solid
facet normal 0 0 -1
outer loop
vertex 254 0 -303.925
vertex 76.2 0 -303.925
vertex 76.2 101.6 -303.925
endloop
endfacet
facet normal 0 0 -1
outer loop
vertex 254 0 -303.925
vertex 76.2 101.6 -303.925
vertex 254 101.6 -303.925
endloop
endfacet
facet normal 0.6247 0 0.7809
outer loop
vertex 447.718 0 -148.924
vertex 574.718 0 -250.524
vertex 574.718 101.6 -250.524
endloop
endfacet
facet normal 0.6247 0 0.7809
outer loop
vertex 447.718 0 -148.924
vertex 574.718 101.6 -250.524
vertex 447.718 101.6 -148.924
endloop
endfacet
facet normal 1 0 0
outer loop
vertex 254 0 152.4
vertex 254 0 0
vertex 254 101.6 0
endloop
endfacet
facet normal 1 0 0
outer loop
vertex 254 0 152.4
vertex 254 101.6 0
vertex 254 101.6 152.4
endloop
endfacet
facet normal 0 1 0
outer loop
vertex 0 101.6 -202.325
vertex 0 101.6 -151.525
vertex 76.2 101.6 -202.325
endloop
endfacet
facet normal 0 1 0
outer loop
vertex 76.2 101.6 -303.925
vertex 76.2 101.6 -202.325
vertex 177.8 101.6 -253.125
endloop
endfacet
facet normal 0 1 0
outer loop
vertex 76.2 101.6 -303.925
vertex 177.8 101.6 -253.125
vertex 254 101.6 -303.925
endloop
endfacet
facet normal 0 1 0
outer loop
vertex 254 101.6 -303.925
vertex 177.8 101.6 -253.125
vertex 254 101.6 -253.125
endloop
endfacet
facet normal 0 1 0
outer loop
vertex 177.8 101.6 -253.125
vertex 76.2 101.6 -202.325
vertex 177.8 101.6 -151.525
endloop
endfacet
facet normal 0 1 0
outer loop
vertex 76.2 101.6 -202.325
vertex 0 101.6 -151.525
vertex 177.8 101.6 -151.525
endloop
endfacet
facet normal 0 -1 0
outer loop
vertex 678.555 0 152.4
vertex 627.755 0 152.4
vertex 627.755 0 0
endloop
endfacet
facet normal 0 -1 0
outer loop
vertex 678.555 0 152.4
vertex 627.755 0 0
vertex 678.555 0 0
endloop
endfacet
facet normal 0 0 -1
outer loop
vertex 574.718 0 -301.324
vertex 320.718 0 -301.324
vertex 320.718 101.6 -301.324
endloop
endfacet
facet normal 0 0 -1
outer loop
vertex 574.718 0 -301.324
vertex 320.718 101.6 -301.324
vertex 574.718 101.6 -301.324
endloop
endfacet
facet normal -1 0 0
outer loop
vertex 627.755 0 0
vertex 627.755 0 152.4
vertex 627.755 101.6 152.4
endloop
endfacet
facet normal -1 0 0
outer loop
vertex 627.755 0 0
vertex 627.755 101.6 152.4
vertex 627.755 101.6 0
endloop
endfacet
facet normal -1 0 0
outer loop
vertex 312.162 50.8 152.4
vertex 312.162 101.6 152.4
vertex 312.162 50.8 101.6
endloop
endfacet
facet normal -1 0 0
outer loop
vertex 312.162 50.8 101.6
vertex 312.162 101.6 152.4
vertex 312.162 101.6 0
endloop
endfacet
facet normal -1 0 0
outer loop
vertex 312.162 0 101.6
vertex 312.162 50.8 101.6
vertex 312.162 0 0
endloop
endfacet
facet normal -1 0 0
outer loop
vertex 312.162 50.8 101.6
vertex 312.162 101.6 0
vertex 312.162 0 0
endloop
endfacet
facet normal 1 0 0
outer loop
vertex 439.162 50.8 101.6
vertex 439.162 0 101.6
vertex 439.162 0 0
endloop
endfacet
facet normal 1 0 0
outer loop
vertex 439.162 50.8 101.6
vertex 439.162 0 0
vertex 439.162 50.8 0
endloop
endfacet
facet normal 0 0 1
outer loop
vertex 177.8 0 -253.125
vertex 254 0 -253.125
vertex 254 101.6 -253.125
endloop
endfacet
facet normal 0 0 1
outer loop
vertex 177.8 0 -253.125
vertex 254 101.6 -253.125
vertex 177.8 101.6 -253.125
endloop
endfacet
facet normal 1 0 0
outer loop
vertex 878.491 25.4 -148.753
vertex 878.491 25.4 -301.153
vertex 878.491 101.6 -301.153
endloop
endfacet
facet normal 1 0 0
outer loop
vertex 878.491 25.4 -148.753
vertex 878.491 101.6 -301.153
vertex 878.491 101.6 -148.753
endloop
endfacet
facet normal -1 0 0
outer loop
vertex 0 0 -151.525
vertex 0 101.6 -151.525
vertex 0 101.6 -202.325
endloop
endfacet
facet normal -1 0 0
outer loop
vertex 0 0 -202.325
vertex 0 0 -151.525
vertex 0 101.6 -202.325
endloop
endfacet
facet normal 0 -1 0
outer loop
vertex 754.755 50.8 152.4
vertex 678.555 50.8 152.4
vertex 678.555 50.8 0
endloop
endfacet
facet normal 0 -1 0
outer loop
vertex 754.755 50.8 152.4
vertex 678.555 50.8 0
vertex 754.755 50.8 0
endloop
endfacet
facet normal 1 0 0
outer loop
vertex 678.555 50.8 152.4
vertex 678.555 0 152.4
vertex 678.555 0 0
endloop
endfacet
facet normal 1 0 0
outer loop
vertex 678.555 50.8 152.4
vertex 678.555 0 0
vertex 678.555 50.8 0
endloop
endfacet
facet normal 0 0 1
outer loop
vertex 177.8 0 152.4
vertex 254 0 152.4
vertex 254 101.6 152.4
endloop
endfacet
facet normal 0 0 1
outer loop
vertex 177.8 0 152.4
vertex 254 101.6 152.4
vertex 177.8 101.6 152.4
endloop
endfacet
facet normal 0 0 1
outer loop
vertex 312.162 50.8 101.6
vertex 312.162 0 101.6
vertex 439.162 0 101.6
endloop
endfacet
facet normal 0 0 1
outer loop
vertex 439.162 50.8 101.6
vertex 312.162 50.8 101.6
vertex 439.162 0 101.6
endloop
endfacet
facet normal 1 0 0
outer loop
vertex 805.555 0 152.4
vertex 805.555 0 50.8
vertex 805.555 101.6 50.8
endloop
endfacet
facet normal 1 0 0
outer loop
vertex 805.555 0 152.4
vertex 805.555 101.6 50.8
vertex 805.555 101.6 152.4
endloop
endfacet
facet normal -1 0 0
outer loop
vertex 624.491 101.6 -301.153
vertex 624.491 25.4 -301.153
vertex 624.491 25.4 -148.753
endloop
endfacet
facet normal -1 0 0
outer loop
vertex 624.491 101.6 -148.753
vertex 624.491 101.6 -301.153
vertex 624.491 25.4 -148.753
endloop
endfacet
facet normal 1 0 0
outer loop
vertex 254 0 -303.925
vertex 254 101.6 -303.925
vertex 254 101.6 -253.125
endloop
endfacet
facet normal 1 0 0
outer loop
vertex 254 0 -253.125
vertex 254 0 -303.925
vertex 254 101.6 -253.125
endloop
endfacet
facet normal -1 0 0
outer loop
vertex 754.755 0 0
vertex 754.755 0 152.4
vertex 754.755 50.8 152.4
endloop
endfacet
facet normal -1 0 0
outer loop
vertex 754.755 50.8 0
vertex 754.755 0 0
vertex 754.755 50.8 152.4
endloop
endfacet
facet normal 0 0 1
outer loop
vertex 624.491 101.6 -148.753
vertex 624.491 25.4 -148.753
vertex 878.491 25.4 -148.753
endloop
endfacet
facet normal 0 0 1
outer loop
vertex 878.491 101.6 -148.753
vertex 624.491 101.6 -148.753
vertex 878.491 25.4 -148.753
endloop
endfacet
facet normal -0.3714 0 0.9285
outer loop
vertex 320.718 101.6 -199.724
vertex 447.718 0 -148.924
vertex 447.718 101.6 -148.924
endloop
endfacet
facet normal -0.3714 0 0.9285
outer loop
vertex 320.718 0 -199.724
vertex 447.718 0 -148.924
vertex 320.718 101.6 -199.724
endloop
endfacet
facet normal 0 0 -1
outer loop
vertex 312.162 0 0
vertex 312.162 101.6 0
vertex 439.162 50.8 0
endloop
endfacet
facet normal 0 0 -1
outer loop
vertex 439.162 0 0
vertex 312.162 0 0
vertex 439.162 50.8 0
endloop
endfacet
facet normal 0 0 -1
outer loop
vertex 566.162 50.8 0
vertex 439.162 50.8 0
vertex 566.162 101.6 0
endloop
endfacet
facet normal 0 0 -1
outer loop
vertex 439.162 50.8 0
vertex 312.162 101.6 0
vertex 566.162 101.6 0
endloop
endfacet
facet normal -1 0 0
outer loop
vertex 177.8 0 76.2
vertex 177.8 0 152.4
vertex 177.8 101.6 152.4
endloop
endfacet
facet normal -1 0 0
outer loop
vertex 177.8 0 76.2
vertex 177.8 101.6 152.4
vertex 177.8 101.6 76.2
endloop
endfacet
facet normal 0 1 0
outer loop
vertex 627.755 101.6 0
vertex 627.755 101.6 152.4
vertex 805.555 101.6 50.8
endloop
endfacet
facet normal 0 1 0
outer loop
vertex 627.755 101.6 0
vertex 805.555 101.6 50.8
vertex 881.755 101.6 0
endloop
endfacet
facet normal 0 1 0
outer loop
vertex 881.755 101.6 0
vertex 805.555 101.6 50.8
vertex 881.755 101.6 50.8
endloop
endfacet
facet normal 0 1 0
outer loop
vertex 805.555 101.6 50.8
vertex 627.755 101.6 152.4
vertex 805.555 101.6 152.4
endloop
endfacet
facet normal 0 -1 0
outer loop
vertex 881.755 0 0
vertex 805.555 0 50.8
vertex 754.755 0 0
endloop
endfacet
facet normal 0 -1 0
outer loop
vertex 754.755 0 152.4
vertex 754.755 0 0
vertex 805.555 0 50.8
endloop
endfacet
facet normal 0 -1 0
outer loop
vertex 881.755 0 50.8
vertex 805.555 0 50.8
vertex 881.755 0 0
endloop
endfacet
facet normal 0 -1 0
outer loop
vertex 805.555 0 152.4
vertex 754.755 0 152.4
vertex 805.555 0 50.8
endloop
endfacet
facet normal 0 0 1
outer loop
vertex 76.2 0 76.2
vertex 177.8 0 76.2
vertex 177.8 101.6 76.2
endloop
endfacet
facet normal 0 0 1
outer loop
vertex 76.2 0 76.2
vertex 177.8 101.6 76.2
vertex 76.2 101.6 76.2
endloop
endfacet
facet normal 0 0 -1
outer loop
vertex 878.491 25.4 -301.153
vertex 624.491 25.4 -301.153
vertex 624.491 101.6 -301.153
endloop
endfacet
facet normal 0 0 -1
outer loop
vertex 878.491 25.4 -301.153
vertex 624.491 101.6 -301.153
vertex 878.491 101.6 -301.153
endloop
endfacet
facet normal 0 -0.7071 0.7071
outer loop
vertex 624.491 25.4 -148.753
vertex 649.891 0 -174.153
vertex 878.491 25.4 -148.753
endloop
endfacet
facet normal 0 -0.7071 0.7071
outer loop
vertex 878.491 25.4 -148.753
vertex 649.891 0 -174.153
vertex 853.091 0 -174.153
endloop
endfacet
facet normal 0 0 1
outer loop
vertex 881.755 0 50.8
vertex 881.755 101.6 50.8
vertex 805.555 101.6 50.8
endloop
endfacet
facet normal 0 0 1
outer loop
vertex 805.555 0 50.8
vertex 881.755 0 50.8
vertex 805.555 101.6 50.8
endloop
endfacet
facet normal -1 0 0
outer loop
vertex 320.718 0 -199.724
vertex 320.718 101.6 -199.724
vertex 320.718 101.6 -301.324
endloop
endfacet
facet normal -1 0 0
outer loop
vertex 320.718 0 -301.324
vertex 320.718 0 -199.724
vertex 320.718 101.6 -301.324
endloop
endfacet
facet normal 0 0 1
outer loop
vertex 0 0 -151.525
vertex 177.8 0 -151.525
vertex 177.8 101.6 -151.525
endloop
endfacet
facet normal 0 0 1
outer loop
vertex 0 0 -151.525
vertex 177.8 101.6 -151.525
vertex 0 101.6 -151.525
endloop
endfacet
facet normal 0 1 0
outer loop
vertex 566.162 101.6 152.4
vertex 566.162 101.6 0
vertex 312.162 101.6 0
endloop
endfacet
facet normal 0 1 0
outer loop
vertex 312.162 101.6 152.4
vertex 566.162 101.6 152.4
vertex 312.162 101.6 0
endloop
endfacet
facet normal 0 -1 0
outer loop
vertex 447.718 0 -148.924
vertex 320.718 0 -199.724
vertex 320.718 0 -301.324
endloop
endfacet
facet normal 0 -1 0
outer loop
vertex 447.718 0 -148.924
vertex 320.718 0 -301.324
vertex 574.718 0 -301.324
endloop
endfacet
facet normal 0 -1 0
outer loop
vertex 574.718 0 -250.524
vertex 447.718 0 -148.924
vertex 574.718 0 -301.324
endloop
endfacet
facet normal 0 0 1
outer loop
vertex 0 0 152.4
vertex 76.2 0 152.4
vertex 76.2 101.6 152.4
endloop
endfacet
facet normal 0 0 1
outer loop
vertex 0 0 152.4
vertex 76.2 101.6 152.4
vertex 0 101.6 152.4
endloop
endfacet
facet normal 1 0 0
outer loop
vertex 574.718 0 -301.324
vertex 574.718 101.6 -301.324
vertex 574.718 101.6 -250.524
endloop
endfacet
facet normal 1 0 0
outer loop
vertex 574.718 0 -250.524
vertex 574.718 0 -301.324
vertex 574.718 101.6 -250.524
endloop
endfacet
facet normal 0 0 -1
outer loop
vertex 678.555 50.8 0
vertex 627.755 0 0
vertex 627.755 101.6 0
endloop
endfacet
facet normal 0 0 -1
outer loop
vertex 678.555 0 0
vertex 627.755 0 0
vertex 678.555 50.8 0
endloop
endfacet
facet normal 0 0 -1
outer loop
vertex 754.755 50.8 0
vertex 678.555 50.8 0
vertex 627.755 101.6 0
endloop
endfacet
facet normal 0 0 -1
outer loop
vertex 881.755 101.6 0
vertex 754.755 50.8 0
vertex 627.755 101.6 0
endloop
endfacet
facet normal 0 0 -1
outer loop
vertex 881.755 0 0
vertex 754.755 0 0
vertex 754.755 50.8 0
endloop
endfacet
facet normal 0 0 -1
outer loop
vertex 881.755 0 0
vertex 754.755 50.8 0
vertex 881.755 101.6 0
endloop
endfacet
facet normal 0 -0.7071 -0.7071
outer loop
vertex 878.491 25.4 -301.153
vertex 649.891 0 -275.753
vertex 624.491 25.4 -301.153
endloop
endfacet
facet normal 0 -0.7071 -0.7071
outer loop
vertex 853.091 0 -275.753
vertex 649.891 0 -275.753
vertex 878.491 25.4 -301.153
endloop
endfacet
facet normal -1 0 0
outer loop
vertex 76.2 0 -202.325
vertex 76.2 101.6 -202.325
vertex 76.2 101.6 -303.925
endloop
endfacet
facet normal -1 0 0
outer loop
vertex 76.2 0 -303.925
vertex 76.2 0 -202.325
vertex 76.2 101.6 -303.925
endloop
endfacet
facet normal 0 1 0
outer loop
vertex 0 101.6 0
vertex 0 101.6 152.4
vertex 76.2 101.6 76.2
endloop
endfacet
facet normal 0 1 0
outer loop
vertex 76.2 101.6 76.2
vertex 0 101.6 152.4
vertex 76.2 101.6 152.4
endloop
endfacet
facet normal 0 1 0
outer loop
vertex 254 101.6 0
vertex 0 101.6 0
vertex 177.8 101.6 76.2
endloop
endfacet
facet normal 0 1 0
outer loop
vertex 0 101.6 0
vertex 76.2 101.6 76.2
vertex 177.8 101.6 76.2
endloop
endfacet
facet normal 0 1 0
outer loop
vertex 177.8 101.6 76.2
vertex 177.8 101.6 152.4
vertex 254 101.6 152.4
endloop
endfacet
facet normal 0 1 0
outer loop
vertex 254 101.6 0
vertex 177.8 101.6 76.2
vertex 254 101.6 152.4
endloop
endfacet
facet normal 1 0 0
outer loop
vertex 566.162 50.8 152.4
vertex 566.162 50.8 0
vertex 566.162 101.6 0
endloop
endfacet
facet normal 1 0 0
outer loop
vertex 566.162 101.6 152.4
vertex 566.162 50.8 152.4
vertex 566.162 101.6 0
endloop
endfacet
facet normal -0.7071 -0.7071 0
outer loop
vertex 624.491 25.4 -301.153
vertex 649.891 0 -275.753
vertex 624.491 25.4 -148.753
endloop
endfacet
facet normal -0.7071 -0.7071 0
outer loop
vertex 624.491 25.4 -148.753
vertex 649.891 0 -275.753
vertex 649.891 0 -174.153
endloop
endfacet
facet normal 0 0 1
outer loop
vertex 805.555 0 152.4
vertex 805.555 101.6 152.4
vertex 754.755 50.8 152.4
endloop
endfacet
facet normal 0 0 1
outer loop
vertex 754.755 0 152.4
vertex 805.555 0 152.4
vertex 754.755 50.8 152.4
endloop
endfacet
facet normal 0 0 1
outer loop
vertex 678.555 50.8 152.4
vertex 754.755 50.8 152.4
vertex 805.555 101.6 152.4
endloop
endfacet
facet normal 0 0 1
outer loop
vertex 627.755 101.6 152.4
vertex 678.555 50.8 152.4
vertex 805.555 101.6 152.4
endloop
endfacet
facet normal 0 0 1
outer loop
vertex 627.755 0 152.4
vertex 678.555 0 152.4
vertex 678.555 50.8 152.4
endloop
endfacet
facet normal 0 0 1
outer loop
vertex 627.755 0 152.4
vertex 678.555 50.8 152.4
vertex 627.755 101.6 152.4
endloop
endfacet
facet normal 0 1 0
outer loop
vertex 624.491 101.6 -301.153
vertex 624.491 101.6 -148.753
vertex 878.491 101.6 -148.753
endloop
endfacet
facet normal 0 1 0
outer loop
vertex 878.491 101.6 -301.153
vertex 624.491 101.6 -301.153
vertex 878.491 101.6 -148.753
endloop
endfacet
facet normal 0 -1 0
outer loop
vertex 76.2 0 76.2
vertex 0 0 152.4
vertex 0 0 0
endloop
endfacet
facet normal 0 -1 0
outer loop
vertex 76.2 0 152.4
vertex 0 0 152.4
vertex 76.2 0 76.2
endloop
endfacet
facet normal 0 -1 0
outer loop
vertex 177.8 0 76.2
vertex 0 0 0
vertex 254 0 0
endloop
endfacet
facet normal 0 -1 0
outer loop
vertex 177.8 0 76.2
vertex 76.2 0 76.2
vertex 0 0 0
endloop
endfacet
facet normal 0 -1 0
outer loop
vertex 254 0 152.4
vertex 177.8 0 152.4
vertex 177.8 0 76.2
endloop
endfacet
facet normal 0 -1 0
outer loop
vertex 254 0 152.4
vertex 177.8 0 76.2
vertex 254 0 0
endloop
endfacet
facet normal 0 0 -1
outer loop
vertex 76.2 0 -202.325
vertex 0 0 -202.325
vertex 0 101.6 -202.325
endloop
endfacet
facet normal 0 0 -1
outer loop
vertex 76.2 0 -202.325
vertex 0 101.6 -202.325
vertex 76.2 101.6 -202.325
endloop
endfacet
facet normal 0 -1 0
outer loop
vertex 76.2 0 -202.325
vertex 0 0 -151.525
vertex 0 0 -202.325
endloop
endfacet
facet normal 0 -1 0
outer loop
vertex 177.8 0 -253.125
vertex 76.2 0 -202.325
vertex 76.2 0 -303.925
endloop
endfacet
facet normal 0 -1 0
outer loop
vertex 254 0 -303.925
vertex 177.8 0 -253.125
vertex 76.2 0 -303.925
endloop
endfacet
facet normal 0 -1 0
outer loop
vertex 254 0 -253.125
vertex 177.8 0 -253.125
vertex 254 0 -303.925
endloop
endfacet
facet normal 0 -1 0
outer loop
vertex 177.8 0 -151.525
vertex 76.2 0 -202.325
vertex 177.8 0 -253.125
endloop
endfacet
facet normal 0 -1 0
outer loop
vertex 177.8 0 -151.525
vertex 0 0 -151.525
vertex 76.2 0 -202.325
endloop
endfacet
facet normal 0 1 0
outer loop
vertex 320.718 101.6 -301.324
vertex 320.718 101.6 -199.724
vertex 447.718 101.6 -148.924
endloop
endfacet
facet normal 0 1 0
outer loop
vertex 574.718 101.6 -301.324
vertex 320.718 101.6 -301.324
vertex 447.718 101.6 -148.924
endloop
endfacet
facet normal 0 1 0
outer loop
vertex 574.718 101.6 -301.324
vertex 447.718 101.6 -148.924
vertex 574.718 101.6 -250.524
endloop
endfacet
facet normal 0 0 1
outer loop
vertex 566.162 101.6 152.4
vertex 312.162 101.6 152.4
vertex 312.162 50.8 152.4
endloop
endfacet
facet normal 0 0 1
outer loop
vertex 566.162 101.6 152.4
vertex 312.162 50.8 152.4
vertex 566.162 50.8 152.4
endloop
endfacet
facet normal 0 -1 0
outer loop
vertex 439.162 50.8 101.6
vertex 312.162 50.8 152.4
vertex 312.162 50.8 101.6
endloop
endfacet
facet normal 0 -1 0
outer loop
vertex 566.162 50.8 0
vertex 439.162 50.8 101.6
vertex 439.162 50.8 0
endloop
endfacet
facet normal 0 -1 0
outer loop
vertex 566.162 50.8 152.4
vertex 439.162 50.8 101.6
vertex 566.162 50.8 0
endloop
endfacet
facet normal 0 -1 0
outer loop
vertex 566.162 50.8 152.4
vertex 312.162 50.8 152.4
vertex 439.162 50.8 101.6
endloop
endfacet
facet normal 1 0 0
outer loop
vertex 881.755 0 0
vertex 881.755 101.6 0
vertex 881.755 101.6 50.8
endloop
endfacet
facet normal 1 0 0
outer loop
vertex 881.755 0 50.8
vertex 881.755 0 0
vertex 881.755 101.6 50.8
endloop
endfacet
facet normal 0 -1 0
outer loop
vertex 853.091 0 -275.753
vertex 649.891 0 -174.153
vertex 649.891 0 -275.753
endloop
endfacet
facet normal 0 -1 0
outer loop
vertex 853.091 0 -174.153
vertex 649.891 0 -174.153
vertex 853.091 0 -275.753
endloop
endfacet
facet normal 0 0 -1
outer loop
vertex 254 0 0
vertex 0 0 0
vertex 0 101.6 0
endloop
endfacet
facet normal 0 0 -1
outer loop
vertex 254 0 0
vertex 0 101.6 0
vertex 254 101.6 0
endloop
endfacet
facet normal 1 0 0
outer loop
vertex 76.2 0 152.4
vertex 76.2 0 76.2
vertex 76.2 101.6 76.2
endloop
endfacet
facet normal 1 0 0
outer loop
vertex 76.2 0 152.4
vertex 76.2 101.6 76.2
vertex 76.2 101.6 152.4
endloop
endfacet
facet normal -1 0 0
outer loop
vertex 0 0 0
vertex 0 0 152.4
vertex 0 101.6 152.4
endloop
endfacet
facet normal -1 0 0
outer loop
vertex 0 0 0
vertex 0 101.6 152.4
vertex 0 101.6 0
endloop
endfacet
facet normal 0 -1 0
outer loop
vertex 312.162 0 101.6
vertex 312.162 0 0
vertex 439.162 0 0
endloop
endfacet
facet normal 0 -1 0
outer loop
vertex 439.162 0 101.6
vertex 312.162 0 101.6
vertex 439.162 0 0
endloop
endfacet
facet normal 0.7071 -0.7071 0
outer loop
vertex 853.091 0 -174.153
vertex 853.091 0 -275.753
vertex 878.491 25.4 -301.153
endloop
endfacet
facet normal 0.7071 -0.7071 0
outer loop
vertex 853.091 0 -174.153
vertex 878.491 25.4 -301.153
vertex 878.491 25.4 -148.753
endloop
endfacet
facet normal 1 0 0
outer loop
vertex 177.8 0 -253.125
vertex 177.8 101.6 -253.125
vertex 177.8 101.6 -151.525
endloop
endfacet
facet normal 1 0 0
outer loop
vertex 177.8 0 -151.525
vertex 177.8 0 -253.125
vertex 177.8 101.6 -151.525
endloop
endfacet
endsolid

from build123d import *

# Parameters (mm, degrees)
F1_DEPTH  = 101.6
F3_DEPTH  = 152.4
F4_W      = 127
F4_H      = 50.8
F5_DEPTH  = 50.8
F6_W      = 127
F6_H      = 50.8
F7_DEPTH  = 50.8
F9_DEPTH  = 101.6
F10_W     = 76.2
F10_H     = 50.8
F11_DEPTH = 152.4
F13_DEPTH = 101.6
F15_DEPTH = 101.6
F16_W     = 254
F16_H     = 152.4
F17_DEPTH = 101.6
F18_SIZE  = 25.4


with BuildPart() as f1:
    # F0 (on Front) → F1 (new body)
    with BuildSketch(Plane.XZ):
        Polygon((0, 152.4), (0, 0), (254, 0), (254, 152.4), (177.8, 152.4), (177.8, 76.2), (76.2, 76.2), (76.2, 152.4), align=None)
    extrude(amount=-F1_DEPTH)


with BuildPart() as f3:
    # F2 (on Top) → F3 (new body)
    with BuildSketch(Plane.XY):
        Polygon((312.16201, 101.6), (312.16201, 0), (439.16201, 0), (439.16201, 50.8), (566.16201, 50.8), (566.16201, 101.6), align=None)
    extrude(amount=F3_DEPTH)

    # F4 (on face) → F5 (join)
    with BuildSketch(Plane.XZ):
        with Locations((375.66201, 127)):
            Rectangle(F4_W, F4_H)
    extrude(amount=-F5_DEPTH)

    # F6 (on face) → F7 (cut)
    with BuildSketch(Plane.XZ):
        with Locations((375.66201, 127)):
            Rectangle(F6_W, F6_H)
    extrude(amount=-F7_DEPTH, mode=Mode.SUBTRACT)


with BuildPart() as f9:
    # F8 (on face) → F9 (new body)
    with BuildSketch(Plane.XZ):
        Polygon((627.754927, 152.4), (627.754927, 0), (881.754927, 0), (881.754927, 50.8), (805.554927, 50.8), (805.554927, 152.4), align=None)
    extrude(amount=-F9_DEPTH)

    # F10 (on face) → F11 (cut)
    with BuildSketch(Plane.XY.offset(152.4)):
        with Locations((716.654927, 25.4)):
            Rectangle(F10_W, F10_H)
    extrude(amount=-F11_DEPTH, mode=Mode.SUBTRACT)


with BuildPart() as f13:
    # F12 (on Front) → F13 (new body)
    with BuildSketch(Plane.XZ):
        Polygon((177.8, -151.525132), (0, -151.525132), (0, -202.325132), (76.2, -202.325132), (76.2, -303.925132), (254, -303.925132), (254, -253.125132), (177.8, -253.125132), align=None)
    extrude(amount=-F13_DEPTH)


with BuildPart() as f15:
    # F14 (on Front) → F15 (new body)
    with BuildSketch(Plane.XZ):
        Polygon((320.718367, -199.723953), (320.718367, -301.323953), (574.718367, -301.323953), (574.718367, -250.523953), (447.718354, -148.923953), align=None)
    extrude(amount=-F15_DEPTH)


with BuildPart() as f17:
    # F16 (on Front) → F17 (new body)
    with BuildSketch(Plane.XZ):
        with Locations((751.49061, -224.953003)):
            Rectangle(F16_W, F16_H)
    extrude(amount=-F17_DEPTH)

    # F18
    f18_edges = [f17.edges().sort_by_distance(p)[0] for p in [
        (624.49061, 0, -224.953003),
        (751.49061, 0, -301.153003),
        (878.49061, 0, -224.953003),
        (751.49061, 0, -148.753003),
    ]]
    chamfer(f18_edges, length=F18_SIZE)


solid = Compound([f1.part, f3.part, f9.part, f13.part, f15.part, f17.part])
